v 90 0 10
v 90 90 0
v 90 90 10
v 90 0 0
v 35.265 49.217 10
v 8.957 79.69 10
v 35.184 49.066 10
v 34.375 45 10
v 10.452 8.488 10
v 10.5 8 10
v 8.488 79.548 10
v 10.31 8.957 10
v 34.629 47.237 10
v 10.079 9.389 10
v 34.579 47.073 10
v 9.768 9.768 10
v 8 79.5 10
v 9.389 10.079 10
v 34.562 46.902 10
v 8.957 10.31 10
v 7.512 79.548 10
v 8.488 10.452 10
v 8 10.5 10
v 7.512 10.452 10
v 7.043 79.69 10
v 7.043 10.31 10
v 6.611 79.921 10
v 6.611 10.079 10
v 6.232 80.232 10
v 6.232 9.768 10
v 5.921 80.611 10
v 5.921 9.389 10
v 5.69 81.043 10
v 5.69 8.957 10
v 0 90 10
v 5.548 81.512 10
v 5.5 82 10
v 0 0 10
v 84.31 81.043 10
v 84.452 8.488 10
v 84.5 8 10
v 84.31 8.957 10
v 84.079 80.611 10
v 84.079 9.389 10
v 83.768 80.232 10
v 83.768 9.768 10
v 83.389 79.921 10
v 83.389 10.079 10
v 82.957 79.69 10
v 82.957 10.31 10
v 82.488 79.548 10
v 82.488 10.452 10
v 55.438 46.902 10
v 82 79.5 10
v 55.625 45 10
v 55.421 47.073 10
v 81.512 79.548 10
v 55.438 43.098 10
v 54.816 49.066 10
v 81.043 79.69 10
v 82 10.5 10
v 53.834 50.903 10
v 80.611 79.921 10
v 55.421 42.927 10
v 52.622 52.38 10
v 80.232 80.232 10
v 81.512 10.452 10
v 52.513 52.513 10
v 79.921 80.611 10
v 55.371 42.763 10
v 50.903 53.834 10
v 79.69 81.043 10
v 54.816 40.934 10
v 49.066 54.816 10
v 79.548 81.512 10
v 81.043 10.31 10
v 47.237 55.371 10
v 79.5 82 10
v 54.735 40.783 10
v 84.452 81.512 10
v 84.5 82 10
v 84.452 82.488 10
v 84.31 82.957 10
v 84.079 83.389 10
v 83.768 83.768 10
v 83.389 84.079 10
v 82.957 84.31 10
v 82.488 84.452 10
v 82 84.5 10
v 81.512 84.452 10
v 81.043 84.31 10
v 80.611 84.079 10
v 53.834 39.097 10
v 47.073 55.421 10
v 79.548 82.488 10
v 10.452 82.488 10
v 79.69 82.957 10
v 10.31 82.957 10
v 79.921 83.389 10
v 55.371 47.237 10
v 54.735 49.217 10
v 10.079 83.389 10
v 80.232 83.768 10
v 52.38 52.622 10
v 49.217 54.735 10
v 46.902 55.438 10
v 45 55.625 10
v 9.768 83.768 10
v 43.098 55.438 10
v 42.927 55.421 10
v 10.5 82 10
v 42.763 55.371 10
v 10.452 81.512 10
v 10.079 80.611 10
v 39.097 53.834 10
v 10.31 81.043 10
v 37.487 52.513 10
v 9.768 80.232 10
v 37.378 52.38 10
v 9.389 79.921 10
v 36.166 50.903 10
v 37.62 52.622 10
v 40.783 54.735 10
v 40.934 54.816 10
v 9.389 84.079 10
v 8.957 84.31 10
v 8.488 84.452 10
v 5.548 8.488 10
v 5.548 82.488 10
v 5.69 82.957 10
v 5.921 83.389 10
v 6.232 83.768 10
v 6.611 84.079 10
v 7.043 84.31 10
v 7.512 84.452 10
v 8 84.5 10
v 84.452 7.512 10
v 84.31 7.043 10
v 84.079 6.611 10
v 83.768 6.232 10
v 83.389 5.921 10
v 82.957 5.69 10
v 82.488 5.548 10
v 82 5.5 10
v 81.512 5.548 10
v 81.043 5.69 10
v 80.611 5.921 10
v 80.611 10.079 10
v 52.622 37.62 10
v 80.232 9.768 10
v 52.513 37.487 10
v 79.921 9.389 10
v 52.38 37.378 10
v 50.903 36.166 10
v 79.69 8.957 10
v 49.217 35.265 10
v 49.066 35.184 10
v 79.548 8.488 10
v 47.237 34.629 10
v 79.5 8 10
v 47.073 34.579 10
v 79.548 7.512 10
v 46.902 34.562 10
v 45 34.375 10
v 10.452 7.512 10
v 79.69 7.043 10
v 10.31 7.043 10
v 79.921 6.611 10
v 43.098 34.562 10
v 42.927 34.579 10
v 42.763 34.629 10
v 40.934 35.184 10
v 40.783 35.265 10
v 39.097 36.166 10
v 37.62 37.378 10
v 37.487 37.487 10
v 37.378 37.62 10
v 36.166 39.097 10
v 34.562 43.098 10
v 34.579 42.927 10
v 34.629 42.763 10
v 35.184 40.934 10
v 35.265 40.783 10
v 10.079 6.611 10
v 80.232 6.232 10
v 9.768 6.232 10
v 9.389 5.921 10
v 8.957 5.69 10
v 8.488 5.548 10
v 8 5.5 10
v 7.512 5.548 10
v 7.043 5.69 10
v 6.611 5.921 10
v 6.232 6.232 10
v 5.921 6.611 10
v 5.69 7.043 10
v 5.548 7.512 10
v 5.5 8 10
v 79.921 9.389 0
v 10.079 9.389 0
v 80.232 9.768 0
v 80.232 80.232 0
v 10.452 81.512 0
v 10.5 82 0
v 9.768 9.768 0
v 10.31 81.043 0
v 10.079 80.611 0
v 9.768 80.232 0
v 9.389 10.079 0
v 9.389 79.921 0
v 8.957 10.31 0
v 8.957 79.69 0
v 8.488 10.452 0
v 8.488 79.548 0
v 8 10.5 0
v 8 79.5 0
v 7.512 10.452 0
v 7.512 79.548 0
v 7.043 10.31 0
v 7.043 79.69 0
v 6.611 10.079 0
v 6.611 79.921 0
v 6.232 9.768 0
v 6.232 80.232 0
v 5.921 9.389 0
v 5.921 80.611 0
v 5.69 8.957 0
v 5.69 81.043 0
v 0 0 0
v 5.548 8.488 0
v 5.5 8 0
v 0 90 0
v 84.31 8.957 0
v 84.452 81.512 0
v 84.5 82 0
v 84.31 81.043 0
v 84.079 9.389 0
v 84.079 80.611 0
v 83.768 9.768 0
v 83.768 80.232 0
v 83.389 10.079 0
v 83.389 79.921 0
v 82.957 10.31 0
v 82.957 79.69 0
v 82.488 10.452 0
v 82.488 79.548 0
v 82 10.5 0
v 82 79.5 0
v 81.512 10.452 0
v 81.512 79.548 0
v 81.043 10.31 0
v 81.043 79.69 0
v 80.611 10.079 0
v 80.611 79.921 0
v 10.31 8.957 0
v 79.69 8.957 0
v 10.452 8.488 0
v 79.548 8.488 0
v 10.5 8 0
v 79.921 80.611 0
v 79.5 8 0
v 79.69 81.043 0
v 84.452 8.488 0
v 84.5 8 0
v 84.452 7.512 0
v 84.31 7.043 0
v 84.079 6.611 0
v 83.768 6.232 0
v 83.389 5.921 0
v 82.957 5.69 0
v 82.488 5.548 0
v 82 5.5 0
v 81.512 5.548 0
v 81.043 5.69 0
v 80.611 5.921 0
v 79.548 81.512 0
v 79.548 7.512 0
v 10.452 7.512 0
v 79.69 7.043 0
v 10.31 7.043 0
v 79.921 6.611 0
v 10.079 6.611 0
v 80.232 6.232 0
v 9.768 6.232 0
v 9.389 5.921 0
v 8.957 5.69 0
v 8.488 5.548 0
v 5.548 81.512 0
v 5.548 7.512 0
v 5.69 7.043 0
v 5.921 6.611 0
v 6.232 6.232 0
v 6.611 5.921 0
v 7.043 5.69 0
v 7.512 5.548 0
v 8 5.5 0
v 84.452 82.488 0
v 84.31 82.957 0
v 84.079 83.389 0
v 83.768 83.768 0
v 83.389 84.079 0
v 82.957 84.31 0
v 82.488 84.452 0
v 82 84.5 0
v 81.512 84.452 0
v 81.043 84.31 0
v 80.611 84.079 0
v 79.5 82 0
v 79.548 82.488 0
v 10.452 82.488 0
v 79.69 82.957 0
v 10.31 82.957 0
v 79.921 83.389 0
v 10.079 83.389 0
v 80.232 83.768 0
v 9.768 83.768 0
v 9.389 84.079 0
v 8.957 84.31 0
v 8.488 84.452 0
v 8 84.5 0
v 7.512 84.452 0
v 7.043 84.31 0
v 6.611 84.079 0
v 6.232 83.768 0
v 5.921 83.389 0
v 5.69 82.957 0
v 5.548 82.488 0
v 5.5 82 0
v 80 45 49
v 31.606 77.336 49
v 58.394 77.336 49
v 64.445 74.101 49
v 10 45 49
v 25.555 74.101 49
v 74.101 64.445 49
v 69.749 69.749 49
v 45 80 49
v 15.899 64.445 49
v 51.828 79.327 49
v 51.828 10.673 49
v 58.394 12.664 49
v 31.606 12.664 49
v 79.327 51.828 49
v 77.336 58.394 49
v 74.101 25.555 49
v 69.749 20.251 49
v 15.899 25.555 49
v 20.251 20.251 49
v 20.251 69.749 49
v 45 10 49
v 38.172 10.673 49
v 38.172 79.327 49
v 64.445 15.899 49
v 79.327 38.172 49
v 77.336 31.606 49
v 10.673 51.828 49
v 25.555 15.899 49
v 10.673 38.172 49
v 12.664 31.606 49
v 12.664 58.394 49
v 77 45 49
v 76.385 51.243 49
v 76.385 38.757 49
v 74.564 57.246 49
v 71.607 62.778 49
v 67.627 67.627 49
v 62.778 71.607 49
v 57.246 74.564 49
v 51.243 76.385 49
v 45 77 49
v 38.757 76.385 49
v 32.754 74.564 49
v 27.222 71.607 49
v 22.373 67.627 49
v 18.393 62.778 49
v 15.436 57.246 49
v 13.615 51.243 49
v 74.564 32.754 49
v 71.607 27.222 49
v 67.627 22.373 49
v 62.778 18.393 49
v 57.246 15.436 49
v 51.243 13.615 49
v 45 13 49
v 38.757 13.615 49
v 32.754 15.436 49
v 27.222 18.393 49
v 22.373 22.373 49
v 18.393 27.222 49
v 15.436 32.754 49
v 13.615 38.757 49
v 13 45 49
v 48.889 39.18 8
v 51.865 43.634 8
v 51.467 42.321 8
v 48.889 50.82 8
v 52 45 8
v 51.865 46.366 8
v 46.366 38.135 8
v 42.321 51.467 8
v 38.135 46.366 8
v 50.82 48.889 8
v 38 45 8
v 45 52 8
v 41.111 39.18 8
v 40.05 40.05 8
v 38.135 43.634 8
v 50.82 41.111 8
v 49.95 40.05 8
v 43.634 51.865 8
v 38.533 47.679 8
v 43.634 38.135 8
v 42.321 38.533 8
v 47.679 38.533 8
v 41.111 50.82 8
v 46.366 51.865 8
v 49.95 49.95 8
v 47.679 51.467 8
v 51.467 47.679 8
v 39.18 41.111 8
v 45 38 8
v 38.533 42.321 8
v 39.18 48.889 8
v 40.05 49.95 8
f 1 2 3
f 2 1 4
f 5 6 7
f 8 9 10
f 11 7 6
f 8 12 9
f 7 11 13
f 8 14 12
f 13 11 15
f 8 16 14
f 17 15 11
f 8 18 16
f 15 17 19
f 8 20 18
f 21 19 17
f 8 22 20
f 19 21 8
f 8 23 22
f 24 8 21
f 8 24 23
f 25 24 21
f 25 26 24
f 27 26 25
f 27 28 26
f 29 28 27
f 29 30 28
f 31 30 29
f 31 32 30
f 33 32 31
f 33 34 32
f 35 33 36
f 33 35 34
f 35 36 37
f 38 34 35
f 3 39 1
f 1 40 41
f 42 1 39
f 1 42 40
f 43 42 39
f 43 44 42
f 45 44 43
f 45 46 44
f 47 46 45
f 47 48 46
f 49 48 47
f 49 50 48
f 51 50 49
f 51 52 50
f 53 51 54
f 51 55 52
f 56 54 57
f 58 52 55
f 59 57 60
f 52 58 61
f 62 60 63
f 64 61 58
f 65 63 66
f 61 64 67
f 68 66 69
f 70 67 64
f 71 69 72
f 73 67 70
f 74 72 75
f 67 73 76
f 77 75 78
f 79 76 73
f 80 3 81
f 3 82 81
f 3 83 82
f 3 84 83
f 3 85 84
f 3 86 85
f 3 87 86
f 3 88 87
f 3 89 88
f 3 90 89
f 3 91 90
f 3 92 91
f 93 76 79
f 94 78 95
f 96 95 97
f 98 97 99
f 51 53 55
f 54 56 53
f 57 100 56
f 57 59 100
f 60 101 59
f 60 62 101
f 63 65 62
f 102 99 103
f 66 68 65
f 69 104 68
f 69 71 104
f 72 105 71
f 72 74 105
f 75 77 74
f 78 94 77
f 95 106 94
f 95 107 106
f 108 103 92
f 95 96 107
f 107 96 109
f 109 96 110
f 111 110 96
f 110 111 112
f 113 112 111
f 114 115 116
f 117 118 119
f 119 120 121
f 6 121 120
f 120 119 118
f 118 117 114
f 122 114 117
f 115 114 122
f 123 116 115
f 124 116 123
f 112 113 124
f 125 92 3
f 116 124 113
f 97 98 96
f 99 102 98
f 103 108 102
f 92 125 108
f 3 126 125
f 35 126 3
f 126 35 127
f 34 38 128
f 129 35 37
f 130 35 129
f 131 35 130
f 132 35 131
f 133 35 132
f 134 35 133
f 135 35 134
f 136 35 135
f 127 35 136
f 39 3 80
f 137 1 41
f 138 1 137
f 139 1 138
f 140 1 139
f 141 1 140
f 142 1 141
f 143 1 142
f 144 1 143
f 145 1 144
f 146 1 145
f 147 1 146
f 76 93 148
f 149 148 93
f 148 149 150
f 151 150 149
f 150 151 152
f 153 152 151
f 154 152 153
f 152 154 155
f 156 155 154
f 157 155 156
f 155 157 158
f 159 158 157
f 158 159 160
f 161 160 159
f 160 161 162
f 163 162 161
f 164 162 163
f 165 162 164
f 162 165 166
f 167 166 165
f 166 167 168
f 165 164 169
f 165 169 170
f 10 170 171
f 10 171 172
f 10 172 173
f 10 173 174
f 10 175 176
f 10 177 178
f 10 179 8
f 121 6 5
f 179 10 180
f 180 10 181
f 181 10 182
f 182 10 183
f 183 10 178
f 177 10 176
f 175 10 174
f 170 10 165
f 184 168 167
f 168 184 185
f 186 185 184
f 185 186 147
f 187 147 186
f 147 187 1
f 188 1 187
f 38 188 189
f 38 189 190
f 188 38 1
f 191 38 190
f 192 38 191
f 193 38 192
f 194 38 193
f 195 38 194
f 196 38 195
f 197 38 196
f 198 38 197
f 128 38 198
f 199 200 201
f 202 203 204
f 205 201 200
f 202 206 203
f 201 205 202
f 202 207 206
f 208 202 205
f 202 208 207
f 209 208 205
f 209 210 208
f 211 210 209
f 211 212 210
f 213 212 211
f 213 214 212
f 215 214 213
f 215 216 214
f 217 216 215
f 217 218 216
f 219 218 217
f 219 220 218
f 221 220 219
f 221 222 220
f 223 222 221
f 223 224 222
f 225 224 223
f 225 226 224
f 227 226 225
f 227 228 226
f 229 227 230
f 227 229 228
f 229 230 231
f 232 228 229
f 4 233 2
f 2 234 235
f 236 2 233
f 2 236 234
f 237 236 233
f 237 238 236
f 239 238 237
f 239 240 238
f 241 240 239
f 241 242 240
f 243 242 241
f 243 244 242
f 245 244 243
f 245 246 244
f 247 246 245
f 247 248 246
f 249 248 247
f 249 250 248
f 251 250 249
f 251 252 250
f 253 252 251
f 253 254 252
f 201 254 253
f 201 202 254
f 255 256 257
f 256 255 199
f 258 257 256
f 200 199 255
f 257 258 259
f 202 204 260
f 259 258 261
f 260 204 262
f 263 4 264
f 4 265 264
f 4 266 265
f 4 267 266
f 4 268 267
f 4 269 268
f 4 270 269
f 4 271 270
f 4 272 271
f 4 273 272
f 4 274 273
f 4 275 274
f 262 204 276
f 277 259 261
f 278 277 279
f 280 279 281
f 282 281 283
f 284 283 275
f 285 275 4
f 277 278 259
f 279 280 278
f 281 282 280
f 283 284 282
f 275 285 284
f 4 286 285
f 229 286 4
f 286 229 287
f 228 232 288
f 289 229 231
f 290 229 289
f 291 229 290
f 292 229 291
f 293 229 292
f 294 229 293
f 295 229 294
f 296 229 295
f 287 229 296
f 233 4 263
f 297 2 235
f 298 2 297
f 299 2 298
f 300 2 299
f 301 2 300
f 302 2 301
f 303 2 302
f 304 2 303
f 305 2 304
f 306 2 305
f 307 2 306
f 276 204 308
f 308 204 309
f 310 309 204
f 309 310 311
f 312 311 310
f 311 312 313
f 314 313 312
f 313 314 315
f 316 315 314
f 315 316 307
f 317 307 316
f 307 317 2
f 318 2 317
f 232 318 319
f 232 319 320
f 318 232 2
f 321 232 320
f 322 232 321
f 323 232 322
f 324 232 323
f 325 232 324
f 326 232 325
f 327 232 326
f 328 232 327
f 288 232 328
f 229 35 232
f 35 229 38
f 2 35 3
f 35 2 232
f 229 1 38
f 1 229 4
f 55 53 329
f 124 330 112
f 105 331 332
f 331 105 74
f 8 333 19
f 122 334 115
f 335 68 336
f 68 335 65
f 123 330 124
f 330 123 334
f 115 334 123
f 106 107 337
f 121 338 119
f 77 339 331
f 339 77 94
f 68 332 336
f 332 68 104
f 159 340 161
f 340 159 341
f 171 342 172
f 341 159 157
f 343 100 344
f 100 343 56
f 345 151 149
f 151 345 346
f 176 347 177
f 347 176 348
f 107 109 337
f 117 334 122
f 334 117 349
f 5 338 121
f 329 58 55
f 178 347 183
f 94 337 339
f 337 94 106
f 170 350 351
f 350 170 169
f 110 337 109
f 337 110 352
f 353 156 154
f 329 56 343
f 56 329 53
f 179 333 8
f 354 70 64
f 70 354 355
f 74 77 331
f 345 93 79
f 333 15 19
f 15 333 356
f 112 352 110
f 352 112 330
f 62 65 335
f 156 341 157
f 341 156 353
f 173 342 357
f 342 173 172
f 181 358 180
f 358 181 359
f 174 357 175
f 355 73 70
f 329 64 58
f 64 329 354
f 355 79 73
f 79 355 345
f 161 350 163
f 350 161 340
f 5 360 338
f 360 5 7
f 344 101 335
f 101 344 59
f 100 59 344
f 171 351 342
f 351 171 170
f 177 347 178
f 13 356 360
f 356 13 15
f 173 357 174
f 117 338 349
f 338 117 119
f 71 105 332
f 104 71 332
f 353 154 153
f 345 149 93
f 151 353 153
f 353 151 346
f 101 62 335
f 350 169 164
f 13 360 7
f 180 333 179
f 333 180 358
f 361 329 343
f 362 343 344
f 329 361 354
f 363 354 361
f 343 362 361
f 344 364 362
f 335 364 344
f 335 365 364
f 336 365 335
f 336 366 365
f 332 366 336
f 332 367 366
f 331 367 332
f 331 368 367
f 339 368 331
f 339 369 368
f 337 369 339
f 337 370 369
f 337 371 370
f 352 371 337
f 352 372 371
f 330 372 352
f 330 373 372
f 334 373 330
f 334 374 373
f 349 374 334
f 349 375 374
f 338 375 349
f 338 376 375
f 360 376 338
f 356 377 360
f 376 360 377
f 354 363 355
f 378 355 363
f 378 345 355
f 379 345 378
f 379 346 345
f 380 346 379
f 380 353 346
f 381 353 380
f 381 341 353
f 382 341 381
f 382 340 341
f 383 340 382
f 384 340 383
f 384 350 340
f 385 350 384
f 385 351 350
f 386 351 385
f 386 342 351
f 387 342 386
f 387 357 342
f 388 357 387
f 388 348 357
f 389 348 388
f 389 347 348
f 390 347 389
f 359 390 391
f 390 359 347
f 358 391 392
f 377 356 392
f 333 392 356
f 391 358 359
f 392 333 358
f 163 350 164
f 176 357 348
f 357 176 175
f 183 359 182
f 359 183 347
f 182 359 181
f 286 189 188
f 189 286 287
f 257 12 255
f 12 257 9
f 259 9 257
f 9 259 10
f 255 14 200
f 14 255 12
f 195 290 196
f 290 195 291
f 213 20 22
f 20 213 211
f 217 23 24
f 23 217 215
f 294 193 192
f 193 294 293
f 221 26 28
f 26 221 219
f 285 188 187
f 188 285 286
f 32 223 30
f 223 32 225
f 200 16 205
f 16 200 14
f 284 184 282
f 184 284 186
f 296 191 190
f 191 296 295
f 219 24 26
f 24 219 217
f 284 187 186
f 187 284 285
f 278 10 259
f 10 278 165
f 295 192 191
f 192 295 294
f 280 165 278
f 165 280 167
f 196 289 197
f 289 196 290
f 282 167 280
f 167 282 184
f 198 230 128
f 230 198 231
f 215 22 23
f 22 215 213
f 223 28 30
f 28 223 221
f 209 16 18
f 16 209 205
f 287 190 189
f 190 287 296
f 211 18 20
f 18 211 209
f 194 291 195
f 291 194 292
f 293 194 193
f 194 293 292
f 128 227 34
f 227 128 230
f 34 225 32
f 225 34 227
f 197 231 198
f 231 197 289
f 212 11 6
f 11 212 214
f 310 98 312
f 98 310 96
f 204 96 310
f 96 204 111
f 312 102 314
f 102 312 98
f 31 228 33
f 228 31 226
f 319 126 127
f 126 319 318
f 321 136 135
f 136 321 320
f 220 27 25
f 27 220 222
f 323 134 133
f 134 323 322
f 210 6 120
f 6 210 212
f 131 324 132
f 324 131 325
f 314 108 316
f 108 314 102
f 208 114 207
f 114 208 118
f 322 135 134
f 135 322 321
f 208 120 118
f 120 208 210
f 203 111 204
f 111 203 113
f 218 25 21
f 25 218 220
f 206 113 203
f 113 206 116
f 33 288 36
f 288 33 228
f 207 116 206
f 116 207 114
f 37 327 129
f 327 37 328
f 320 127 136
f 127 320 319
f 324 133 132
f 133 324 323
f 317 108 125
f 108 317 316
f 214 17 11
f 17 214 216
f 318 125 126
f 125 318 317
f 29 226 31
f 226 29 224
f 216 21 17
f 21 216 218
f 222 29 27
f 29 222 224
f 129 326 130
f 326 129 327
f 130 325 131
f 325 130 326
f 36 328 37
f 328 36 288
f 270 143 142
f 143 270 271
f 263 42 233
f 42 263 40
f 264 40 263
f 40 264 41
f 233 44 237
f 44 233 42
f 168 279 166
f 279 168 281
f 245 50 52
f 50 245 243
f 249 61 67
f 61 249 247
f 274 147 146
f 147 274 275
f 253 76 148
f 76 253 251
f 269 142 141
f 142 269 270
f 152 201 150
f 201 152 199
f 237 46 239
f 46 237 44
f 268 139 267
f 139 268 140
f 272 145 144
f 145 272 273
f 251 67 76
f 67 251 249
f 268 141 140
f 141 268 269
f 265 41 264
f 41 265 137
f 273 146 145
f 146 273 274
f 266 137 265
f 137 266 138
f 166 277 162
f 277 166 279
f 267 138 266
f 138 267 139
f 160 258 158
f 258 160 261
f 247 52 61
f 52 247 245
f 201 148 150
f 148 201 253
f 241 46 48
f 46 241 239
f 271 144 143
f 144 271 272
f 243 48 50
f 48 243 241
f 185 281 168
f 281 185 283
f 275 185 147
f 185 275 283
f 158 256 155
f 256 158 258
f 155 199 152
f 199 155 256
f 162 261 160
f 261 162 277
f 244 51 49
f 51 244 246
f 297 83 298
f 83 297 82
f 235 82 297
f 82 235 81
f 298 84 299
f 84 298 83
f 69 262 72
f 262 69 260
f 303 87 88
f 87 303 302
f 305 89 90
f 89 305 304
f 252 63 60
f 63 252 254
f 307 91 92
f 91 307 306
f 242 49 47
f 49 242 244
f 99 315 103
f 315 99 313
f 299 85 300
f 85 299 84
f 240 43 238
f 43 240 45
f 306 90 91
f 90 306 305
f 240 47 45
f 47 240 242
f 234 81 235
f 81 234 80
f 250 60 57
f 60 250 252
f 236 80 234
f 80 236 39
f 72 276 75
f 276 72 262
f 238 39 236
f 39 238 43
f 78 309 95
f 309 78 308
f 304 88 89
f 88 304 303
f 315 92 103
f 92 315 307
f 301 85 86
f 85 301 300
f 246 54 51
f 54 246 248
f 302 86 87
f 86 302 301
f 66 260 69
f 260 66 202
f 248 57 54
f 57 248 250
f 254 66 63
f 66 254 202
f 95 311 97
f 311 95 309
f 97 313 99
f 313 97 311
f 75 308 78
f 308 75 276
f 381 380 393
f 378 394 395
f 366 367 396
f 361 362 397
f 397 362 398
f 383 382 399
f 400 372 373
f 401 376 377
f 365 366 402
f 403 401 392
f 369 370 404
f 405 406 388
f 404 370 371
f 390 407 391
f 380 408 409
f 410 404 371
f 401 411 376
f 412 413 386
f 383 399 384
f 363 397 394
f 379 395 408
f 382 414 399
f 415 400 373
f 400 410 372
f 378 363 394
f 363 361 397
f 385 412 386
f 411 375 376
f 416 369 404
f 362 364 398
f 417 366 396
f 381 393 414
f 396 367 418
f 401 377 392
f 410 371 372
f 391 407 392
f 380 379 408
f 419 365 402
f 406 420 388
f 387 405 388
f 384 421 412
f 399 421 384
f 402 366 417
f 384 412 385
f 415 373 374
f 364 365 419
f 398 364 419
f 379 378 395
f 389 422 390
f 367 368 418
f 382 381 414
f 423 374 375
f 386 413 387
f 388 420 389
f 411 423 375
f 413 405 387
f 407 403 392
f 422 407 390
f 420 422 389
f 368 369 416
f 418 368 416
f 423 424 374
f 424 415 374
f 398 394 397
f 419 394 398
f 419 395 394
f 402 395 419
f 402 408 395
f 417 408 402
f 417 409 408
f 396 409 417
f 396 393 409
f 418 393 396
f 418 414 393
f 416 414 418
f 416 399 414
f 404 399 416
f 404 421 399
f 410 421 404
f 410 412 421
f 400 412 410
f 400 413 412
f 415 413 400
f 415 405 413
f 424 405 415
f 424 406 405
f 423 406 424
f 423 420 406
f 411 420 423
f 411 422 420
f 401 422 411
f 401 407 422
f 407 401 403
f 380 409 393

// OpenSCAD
$fn = 32;

// ----------------------------------------------------------------------
// Hopper: flanged with square flange
// ----------------------------------------------------------------------

// --- parameters (mm) ---
fl = 90;                  // flange side, X and Y
fl_t = 10;                // flange thickness
cone_h = 40;              // cone height above the flange
top_d = 70;               // cone mouth diameter
bot_d = 20;               // cone spout diameter
wall = 3;                 // cone wall thickness
hole_r = 2.5;             // flange hole radius
hole_in = 8;              // hole inset from the corners

bore_d = bot_d - 2 * wall;  // spout bore diameter
total_h = fl_t + cone_h - 1;  // overall height

difference() {
  union() {
    cube([fl, fl, fl_t]);
    translate([fl / 2, fl / 2, fl_t - 1])
      cylinder(h = cone_h, d1 = bot_d, d2 = top_d);
  }
  translate([fl / 2, fl / 2, fl_t - 2])
    cylinder(h = cone_h + 1, d1 = bore_d, d2 = top_d - 2 * wall);
  for (sx = [0, 1], sy = [0, 1])
    translate([sx ? fl - hole_in : hole_in,
               sy ? fl - hole_in : hole_in, -1])
      cylinder(r = hole_r, h = fl_t + 2);
}
